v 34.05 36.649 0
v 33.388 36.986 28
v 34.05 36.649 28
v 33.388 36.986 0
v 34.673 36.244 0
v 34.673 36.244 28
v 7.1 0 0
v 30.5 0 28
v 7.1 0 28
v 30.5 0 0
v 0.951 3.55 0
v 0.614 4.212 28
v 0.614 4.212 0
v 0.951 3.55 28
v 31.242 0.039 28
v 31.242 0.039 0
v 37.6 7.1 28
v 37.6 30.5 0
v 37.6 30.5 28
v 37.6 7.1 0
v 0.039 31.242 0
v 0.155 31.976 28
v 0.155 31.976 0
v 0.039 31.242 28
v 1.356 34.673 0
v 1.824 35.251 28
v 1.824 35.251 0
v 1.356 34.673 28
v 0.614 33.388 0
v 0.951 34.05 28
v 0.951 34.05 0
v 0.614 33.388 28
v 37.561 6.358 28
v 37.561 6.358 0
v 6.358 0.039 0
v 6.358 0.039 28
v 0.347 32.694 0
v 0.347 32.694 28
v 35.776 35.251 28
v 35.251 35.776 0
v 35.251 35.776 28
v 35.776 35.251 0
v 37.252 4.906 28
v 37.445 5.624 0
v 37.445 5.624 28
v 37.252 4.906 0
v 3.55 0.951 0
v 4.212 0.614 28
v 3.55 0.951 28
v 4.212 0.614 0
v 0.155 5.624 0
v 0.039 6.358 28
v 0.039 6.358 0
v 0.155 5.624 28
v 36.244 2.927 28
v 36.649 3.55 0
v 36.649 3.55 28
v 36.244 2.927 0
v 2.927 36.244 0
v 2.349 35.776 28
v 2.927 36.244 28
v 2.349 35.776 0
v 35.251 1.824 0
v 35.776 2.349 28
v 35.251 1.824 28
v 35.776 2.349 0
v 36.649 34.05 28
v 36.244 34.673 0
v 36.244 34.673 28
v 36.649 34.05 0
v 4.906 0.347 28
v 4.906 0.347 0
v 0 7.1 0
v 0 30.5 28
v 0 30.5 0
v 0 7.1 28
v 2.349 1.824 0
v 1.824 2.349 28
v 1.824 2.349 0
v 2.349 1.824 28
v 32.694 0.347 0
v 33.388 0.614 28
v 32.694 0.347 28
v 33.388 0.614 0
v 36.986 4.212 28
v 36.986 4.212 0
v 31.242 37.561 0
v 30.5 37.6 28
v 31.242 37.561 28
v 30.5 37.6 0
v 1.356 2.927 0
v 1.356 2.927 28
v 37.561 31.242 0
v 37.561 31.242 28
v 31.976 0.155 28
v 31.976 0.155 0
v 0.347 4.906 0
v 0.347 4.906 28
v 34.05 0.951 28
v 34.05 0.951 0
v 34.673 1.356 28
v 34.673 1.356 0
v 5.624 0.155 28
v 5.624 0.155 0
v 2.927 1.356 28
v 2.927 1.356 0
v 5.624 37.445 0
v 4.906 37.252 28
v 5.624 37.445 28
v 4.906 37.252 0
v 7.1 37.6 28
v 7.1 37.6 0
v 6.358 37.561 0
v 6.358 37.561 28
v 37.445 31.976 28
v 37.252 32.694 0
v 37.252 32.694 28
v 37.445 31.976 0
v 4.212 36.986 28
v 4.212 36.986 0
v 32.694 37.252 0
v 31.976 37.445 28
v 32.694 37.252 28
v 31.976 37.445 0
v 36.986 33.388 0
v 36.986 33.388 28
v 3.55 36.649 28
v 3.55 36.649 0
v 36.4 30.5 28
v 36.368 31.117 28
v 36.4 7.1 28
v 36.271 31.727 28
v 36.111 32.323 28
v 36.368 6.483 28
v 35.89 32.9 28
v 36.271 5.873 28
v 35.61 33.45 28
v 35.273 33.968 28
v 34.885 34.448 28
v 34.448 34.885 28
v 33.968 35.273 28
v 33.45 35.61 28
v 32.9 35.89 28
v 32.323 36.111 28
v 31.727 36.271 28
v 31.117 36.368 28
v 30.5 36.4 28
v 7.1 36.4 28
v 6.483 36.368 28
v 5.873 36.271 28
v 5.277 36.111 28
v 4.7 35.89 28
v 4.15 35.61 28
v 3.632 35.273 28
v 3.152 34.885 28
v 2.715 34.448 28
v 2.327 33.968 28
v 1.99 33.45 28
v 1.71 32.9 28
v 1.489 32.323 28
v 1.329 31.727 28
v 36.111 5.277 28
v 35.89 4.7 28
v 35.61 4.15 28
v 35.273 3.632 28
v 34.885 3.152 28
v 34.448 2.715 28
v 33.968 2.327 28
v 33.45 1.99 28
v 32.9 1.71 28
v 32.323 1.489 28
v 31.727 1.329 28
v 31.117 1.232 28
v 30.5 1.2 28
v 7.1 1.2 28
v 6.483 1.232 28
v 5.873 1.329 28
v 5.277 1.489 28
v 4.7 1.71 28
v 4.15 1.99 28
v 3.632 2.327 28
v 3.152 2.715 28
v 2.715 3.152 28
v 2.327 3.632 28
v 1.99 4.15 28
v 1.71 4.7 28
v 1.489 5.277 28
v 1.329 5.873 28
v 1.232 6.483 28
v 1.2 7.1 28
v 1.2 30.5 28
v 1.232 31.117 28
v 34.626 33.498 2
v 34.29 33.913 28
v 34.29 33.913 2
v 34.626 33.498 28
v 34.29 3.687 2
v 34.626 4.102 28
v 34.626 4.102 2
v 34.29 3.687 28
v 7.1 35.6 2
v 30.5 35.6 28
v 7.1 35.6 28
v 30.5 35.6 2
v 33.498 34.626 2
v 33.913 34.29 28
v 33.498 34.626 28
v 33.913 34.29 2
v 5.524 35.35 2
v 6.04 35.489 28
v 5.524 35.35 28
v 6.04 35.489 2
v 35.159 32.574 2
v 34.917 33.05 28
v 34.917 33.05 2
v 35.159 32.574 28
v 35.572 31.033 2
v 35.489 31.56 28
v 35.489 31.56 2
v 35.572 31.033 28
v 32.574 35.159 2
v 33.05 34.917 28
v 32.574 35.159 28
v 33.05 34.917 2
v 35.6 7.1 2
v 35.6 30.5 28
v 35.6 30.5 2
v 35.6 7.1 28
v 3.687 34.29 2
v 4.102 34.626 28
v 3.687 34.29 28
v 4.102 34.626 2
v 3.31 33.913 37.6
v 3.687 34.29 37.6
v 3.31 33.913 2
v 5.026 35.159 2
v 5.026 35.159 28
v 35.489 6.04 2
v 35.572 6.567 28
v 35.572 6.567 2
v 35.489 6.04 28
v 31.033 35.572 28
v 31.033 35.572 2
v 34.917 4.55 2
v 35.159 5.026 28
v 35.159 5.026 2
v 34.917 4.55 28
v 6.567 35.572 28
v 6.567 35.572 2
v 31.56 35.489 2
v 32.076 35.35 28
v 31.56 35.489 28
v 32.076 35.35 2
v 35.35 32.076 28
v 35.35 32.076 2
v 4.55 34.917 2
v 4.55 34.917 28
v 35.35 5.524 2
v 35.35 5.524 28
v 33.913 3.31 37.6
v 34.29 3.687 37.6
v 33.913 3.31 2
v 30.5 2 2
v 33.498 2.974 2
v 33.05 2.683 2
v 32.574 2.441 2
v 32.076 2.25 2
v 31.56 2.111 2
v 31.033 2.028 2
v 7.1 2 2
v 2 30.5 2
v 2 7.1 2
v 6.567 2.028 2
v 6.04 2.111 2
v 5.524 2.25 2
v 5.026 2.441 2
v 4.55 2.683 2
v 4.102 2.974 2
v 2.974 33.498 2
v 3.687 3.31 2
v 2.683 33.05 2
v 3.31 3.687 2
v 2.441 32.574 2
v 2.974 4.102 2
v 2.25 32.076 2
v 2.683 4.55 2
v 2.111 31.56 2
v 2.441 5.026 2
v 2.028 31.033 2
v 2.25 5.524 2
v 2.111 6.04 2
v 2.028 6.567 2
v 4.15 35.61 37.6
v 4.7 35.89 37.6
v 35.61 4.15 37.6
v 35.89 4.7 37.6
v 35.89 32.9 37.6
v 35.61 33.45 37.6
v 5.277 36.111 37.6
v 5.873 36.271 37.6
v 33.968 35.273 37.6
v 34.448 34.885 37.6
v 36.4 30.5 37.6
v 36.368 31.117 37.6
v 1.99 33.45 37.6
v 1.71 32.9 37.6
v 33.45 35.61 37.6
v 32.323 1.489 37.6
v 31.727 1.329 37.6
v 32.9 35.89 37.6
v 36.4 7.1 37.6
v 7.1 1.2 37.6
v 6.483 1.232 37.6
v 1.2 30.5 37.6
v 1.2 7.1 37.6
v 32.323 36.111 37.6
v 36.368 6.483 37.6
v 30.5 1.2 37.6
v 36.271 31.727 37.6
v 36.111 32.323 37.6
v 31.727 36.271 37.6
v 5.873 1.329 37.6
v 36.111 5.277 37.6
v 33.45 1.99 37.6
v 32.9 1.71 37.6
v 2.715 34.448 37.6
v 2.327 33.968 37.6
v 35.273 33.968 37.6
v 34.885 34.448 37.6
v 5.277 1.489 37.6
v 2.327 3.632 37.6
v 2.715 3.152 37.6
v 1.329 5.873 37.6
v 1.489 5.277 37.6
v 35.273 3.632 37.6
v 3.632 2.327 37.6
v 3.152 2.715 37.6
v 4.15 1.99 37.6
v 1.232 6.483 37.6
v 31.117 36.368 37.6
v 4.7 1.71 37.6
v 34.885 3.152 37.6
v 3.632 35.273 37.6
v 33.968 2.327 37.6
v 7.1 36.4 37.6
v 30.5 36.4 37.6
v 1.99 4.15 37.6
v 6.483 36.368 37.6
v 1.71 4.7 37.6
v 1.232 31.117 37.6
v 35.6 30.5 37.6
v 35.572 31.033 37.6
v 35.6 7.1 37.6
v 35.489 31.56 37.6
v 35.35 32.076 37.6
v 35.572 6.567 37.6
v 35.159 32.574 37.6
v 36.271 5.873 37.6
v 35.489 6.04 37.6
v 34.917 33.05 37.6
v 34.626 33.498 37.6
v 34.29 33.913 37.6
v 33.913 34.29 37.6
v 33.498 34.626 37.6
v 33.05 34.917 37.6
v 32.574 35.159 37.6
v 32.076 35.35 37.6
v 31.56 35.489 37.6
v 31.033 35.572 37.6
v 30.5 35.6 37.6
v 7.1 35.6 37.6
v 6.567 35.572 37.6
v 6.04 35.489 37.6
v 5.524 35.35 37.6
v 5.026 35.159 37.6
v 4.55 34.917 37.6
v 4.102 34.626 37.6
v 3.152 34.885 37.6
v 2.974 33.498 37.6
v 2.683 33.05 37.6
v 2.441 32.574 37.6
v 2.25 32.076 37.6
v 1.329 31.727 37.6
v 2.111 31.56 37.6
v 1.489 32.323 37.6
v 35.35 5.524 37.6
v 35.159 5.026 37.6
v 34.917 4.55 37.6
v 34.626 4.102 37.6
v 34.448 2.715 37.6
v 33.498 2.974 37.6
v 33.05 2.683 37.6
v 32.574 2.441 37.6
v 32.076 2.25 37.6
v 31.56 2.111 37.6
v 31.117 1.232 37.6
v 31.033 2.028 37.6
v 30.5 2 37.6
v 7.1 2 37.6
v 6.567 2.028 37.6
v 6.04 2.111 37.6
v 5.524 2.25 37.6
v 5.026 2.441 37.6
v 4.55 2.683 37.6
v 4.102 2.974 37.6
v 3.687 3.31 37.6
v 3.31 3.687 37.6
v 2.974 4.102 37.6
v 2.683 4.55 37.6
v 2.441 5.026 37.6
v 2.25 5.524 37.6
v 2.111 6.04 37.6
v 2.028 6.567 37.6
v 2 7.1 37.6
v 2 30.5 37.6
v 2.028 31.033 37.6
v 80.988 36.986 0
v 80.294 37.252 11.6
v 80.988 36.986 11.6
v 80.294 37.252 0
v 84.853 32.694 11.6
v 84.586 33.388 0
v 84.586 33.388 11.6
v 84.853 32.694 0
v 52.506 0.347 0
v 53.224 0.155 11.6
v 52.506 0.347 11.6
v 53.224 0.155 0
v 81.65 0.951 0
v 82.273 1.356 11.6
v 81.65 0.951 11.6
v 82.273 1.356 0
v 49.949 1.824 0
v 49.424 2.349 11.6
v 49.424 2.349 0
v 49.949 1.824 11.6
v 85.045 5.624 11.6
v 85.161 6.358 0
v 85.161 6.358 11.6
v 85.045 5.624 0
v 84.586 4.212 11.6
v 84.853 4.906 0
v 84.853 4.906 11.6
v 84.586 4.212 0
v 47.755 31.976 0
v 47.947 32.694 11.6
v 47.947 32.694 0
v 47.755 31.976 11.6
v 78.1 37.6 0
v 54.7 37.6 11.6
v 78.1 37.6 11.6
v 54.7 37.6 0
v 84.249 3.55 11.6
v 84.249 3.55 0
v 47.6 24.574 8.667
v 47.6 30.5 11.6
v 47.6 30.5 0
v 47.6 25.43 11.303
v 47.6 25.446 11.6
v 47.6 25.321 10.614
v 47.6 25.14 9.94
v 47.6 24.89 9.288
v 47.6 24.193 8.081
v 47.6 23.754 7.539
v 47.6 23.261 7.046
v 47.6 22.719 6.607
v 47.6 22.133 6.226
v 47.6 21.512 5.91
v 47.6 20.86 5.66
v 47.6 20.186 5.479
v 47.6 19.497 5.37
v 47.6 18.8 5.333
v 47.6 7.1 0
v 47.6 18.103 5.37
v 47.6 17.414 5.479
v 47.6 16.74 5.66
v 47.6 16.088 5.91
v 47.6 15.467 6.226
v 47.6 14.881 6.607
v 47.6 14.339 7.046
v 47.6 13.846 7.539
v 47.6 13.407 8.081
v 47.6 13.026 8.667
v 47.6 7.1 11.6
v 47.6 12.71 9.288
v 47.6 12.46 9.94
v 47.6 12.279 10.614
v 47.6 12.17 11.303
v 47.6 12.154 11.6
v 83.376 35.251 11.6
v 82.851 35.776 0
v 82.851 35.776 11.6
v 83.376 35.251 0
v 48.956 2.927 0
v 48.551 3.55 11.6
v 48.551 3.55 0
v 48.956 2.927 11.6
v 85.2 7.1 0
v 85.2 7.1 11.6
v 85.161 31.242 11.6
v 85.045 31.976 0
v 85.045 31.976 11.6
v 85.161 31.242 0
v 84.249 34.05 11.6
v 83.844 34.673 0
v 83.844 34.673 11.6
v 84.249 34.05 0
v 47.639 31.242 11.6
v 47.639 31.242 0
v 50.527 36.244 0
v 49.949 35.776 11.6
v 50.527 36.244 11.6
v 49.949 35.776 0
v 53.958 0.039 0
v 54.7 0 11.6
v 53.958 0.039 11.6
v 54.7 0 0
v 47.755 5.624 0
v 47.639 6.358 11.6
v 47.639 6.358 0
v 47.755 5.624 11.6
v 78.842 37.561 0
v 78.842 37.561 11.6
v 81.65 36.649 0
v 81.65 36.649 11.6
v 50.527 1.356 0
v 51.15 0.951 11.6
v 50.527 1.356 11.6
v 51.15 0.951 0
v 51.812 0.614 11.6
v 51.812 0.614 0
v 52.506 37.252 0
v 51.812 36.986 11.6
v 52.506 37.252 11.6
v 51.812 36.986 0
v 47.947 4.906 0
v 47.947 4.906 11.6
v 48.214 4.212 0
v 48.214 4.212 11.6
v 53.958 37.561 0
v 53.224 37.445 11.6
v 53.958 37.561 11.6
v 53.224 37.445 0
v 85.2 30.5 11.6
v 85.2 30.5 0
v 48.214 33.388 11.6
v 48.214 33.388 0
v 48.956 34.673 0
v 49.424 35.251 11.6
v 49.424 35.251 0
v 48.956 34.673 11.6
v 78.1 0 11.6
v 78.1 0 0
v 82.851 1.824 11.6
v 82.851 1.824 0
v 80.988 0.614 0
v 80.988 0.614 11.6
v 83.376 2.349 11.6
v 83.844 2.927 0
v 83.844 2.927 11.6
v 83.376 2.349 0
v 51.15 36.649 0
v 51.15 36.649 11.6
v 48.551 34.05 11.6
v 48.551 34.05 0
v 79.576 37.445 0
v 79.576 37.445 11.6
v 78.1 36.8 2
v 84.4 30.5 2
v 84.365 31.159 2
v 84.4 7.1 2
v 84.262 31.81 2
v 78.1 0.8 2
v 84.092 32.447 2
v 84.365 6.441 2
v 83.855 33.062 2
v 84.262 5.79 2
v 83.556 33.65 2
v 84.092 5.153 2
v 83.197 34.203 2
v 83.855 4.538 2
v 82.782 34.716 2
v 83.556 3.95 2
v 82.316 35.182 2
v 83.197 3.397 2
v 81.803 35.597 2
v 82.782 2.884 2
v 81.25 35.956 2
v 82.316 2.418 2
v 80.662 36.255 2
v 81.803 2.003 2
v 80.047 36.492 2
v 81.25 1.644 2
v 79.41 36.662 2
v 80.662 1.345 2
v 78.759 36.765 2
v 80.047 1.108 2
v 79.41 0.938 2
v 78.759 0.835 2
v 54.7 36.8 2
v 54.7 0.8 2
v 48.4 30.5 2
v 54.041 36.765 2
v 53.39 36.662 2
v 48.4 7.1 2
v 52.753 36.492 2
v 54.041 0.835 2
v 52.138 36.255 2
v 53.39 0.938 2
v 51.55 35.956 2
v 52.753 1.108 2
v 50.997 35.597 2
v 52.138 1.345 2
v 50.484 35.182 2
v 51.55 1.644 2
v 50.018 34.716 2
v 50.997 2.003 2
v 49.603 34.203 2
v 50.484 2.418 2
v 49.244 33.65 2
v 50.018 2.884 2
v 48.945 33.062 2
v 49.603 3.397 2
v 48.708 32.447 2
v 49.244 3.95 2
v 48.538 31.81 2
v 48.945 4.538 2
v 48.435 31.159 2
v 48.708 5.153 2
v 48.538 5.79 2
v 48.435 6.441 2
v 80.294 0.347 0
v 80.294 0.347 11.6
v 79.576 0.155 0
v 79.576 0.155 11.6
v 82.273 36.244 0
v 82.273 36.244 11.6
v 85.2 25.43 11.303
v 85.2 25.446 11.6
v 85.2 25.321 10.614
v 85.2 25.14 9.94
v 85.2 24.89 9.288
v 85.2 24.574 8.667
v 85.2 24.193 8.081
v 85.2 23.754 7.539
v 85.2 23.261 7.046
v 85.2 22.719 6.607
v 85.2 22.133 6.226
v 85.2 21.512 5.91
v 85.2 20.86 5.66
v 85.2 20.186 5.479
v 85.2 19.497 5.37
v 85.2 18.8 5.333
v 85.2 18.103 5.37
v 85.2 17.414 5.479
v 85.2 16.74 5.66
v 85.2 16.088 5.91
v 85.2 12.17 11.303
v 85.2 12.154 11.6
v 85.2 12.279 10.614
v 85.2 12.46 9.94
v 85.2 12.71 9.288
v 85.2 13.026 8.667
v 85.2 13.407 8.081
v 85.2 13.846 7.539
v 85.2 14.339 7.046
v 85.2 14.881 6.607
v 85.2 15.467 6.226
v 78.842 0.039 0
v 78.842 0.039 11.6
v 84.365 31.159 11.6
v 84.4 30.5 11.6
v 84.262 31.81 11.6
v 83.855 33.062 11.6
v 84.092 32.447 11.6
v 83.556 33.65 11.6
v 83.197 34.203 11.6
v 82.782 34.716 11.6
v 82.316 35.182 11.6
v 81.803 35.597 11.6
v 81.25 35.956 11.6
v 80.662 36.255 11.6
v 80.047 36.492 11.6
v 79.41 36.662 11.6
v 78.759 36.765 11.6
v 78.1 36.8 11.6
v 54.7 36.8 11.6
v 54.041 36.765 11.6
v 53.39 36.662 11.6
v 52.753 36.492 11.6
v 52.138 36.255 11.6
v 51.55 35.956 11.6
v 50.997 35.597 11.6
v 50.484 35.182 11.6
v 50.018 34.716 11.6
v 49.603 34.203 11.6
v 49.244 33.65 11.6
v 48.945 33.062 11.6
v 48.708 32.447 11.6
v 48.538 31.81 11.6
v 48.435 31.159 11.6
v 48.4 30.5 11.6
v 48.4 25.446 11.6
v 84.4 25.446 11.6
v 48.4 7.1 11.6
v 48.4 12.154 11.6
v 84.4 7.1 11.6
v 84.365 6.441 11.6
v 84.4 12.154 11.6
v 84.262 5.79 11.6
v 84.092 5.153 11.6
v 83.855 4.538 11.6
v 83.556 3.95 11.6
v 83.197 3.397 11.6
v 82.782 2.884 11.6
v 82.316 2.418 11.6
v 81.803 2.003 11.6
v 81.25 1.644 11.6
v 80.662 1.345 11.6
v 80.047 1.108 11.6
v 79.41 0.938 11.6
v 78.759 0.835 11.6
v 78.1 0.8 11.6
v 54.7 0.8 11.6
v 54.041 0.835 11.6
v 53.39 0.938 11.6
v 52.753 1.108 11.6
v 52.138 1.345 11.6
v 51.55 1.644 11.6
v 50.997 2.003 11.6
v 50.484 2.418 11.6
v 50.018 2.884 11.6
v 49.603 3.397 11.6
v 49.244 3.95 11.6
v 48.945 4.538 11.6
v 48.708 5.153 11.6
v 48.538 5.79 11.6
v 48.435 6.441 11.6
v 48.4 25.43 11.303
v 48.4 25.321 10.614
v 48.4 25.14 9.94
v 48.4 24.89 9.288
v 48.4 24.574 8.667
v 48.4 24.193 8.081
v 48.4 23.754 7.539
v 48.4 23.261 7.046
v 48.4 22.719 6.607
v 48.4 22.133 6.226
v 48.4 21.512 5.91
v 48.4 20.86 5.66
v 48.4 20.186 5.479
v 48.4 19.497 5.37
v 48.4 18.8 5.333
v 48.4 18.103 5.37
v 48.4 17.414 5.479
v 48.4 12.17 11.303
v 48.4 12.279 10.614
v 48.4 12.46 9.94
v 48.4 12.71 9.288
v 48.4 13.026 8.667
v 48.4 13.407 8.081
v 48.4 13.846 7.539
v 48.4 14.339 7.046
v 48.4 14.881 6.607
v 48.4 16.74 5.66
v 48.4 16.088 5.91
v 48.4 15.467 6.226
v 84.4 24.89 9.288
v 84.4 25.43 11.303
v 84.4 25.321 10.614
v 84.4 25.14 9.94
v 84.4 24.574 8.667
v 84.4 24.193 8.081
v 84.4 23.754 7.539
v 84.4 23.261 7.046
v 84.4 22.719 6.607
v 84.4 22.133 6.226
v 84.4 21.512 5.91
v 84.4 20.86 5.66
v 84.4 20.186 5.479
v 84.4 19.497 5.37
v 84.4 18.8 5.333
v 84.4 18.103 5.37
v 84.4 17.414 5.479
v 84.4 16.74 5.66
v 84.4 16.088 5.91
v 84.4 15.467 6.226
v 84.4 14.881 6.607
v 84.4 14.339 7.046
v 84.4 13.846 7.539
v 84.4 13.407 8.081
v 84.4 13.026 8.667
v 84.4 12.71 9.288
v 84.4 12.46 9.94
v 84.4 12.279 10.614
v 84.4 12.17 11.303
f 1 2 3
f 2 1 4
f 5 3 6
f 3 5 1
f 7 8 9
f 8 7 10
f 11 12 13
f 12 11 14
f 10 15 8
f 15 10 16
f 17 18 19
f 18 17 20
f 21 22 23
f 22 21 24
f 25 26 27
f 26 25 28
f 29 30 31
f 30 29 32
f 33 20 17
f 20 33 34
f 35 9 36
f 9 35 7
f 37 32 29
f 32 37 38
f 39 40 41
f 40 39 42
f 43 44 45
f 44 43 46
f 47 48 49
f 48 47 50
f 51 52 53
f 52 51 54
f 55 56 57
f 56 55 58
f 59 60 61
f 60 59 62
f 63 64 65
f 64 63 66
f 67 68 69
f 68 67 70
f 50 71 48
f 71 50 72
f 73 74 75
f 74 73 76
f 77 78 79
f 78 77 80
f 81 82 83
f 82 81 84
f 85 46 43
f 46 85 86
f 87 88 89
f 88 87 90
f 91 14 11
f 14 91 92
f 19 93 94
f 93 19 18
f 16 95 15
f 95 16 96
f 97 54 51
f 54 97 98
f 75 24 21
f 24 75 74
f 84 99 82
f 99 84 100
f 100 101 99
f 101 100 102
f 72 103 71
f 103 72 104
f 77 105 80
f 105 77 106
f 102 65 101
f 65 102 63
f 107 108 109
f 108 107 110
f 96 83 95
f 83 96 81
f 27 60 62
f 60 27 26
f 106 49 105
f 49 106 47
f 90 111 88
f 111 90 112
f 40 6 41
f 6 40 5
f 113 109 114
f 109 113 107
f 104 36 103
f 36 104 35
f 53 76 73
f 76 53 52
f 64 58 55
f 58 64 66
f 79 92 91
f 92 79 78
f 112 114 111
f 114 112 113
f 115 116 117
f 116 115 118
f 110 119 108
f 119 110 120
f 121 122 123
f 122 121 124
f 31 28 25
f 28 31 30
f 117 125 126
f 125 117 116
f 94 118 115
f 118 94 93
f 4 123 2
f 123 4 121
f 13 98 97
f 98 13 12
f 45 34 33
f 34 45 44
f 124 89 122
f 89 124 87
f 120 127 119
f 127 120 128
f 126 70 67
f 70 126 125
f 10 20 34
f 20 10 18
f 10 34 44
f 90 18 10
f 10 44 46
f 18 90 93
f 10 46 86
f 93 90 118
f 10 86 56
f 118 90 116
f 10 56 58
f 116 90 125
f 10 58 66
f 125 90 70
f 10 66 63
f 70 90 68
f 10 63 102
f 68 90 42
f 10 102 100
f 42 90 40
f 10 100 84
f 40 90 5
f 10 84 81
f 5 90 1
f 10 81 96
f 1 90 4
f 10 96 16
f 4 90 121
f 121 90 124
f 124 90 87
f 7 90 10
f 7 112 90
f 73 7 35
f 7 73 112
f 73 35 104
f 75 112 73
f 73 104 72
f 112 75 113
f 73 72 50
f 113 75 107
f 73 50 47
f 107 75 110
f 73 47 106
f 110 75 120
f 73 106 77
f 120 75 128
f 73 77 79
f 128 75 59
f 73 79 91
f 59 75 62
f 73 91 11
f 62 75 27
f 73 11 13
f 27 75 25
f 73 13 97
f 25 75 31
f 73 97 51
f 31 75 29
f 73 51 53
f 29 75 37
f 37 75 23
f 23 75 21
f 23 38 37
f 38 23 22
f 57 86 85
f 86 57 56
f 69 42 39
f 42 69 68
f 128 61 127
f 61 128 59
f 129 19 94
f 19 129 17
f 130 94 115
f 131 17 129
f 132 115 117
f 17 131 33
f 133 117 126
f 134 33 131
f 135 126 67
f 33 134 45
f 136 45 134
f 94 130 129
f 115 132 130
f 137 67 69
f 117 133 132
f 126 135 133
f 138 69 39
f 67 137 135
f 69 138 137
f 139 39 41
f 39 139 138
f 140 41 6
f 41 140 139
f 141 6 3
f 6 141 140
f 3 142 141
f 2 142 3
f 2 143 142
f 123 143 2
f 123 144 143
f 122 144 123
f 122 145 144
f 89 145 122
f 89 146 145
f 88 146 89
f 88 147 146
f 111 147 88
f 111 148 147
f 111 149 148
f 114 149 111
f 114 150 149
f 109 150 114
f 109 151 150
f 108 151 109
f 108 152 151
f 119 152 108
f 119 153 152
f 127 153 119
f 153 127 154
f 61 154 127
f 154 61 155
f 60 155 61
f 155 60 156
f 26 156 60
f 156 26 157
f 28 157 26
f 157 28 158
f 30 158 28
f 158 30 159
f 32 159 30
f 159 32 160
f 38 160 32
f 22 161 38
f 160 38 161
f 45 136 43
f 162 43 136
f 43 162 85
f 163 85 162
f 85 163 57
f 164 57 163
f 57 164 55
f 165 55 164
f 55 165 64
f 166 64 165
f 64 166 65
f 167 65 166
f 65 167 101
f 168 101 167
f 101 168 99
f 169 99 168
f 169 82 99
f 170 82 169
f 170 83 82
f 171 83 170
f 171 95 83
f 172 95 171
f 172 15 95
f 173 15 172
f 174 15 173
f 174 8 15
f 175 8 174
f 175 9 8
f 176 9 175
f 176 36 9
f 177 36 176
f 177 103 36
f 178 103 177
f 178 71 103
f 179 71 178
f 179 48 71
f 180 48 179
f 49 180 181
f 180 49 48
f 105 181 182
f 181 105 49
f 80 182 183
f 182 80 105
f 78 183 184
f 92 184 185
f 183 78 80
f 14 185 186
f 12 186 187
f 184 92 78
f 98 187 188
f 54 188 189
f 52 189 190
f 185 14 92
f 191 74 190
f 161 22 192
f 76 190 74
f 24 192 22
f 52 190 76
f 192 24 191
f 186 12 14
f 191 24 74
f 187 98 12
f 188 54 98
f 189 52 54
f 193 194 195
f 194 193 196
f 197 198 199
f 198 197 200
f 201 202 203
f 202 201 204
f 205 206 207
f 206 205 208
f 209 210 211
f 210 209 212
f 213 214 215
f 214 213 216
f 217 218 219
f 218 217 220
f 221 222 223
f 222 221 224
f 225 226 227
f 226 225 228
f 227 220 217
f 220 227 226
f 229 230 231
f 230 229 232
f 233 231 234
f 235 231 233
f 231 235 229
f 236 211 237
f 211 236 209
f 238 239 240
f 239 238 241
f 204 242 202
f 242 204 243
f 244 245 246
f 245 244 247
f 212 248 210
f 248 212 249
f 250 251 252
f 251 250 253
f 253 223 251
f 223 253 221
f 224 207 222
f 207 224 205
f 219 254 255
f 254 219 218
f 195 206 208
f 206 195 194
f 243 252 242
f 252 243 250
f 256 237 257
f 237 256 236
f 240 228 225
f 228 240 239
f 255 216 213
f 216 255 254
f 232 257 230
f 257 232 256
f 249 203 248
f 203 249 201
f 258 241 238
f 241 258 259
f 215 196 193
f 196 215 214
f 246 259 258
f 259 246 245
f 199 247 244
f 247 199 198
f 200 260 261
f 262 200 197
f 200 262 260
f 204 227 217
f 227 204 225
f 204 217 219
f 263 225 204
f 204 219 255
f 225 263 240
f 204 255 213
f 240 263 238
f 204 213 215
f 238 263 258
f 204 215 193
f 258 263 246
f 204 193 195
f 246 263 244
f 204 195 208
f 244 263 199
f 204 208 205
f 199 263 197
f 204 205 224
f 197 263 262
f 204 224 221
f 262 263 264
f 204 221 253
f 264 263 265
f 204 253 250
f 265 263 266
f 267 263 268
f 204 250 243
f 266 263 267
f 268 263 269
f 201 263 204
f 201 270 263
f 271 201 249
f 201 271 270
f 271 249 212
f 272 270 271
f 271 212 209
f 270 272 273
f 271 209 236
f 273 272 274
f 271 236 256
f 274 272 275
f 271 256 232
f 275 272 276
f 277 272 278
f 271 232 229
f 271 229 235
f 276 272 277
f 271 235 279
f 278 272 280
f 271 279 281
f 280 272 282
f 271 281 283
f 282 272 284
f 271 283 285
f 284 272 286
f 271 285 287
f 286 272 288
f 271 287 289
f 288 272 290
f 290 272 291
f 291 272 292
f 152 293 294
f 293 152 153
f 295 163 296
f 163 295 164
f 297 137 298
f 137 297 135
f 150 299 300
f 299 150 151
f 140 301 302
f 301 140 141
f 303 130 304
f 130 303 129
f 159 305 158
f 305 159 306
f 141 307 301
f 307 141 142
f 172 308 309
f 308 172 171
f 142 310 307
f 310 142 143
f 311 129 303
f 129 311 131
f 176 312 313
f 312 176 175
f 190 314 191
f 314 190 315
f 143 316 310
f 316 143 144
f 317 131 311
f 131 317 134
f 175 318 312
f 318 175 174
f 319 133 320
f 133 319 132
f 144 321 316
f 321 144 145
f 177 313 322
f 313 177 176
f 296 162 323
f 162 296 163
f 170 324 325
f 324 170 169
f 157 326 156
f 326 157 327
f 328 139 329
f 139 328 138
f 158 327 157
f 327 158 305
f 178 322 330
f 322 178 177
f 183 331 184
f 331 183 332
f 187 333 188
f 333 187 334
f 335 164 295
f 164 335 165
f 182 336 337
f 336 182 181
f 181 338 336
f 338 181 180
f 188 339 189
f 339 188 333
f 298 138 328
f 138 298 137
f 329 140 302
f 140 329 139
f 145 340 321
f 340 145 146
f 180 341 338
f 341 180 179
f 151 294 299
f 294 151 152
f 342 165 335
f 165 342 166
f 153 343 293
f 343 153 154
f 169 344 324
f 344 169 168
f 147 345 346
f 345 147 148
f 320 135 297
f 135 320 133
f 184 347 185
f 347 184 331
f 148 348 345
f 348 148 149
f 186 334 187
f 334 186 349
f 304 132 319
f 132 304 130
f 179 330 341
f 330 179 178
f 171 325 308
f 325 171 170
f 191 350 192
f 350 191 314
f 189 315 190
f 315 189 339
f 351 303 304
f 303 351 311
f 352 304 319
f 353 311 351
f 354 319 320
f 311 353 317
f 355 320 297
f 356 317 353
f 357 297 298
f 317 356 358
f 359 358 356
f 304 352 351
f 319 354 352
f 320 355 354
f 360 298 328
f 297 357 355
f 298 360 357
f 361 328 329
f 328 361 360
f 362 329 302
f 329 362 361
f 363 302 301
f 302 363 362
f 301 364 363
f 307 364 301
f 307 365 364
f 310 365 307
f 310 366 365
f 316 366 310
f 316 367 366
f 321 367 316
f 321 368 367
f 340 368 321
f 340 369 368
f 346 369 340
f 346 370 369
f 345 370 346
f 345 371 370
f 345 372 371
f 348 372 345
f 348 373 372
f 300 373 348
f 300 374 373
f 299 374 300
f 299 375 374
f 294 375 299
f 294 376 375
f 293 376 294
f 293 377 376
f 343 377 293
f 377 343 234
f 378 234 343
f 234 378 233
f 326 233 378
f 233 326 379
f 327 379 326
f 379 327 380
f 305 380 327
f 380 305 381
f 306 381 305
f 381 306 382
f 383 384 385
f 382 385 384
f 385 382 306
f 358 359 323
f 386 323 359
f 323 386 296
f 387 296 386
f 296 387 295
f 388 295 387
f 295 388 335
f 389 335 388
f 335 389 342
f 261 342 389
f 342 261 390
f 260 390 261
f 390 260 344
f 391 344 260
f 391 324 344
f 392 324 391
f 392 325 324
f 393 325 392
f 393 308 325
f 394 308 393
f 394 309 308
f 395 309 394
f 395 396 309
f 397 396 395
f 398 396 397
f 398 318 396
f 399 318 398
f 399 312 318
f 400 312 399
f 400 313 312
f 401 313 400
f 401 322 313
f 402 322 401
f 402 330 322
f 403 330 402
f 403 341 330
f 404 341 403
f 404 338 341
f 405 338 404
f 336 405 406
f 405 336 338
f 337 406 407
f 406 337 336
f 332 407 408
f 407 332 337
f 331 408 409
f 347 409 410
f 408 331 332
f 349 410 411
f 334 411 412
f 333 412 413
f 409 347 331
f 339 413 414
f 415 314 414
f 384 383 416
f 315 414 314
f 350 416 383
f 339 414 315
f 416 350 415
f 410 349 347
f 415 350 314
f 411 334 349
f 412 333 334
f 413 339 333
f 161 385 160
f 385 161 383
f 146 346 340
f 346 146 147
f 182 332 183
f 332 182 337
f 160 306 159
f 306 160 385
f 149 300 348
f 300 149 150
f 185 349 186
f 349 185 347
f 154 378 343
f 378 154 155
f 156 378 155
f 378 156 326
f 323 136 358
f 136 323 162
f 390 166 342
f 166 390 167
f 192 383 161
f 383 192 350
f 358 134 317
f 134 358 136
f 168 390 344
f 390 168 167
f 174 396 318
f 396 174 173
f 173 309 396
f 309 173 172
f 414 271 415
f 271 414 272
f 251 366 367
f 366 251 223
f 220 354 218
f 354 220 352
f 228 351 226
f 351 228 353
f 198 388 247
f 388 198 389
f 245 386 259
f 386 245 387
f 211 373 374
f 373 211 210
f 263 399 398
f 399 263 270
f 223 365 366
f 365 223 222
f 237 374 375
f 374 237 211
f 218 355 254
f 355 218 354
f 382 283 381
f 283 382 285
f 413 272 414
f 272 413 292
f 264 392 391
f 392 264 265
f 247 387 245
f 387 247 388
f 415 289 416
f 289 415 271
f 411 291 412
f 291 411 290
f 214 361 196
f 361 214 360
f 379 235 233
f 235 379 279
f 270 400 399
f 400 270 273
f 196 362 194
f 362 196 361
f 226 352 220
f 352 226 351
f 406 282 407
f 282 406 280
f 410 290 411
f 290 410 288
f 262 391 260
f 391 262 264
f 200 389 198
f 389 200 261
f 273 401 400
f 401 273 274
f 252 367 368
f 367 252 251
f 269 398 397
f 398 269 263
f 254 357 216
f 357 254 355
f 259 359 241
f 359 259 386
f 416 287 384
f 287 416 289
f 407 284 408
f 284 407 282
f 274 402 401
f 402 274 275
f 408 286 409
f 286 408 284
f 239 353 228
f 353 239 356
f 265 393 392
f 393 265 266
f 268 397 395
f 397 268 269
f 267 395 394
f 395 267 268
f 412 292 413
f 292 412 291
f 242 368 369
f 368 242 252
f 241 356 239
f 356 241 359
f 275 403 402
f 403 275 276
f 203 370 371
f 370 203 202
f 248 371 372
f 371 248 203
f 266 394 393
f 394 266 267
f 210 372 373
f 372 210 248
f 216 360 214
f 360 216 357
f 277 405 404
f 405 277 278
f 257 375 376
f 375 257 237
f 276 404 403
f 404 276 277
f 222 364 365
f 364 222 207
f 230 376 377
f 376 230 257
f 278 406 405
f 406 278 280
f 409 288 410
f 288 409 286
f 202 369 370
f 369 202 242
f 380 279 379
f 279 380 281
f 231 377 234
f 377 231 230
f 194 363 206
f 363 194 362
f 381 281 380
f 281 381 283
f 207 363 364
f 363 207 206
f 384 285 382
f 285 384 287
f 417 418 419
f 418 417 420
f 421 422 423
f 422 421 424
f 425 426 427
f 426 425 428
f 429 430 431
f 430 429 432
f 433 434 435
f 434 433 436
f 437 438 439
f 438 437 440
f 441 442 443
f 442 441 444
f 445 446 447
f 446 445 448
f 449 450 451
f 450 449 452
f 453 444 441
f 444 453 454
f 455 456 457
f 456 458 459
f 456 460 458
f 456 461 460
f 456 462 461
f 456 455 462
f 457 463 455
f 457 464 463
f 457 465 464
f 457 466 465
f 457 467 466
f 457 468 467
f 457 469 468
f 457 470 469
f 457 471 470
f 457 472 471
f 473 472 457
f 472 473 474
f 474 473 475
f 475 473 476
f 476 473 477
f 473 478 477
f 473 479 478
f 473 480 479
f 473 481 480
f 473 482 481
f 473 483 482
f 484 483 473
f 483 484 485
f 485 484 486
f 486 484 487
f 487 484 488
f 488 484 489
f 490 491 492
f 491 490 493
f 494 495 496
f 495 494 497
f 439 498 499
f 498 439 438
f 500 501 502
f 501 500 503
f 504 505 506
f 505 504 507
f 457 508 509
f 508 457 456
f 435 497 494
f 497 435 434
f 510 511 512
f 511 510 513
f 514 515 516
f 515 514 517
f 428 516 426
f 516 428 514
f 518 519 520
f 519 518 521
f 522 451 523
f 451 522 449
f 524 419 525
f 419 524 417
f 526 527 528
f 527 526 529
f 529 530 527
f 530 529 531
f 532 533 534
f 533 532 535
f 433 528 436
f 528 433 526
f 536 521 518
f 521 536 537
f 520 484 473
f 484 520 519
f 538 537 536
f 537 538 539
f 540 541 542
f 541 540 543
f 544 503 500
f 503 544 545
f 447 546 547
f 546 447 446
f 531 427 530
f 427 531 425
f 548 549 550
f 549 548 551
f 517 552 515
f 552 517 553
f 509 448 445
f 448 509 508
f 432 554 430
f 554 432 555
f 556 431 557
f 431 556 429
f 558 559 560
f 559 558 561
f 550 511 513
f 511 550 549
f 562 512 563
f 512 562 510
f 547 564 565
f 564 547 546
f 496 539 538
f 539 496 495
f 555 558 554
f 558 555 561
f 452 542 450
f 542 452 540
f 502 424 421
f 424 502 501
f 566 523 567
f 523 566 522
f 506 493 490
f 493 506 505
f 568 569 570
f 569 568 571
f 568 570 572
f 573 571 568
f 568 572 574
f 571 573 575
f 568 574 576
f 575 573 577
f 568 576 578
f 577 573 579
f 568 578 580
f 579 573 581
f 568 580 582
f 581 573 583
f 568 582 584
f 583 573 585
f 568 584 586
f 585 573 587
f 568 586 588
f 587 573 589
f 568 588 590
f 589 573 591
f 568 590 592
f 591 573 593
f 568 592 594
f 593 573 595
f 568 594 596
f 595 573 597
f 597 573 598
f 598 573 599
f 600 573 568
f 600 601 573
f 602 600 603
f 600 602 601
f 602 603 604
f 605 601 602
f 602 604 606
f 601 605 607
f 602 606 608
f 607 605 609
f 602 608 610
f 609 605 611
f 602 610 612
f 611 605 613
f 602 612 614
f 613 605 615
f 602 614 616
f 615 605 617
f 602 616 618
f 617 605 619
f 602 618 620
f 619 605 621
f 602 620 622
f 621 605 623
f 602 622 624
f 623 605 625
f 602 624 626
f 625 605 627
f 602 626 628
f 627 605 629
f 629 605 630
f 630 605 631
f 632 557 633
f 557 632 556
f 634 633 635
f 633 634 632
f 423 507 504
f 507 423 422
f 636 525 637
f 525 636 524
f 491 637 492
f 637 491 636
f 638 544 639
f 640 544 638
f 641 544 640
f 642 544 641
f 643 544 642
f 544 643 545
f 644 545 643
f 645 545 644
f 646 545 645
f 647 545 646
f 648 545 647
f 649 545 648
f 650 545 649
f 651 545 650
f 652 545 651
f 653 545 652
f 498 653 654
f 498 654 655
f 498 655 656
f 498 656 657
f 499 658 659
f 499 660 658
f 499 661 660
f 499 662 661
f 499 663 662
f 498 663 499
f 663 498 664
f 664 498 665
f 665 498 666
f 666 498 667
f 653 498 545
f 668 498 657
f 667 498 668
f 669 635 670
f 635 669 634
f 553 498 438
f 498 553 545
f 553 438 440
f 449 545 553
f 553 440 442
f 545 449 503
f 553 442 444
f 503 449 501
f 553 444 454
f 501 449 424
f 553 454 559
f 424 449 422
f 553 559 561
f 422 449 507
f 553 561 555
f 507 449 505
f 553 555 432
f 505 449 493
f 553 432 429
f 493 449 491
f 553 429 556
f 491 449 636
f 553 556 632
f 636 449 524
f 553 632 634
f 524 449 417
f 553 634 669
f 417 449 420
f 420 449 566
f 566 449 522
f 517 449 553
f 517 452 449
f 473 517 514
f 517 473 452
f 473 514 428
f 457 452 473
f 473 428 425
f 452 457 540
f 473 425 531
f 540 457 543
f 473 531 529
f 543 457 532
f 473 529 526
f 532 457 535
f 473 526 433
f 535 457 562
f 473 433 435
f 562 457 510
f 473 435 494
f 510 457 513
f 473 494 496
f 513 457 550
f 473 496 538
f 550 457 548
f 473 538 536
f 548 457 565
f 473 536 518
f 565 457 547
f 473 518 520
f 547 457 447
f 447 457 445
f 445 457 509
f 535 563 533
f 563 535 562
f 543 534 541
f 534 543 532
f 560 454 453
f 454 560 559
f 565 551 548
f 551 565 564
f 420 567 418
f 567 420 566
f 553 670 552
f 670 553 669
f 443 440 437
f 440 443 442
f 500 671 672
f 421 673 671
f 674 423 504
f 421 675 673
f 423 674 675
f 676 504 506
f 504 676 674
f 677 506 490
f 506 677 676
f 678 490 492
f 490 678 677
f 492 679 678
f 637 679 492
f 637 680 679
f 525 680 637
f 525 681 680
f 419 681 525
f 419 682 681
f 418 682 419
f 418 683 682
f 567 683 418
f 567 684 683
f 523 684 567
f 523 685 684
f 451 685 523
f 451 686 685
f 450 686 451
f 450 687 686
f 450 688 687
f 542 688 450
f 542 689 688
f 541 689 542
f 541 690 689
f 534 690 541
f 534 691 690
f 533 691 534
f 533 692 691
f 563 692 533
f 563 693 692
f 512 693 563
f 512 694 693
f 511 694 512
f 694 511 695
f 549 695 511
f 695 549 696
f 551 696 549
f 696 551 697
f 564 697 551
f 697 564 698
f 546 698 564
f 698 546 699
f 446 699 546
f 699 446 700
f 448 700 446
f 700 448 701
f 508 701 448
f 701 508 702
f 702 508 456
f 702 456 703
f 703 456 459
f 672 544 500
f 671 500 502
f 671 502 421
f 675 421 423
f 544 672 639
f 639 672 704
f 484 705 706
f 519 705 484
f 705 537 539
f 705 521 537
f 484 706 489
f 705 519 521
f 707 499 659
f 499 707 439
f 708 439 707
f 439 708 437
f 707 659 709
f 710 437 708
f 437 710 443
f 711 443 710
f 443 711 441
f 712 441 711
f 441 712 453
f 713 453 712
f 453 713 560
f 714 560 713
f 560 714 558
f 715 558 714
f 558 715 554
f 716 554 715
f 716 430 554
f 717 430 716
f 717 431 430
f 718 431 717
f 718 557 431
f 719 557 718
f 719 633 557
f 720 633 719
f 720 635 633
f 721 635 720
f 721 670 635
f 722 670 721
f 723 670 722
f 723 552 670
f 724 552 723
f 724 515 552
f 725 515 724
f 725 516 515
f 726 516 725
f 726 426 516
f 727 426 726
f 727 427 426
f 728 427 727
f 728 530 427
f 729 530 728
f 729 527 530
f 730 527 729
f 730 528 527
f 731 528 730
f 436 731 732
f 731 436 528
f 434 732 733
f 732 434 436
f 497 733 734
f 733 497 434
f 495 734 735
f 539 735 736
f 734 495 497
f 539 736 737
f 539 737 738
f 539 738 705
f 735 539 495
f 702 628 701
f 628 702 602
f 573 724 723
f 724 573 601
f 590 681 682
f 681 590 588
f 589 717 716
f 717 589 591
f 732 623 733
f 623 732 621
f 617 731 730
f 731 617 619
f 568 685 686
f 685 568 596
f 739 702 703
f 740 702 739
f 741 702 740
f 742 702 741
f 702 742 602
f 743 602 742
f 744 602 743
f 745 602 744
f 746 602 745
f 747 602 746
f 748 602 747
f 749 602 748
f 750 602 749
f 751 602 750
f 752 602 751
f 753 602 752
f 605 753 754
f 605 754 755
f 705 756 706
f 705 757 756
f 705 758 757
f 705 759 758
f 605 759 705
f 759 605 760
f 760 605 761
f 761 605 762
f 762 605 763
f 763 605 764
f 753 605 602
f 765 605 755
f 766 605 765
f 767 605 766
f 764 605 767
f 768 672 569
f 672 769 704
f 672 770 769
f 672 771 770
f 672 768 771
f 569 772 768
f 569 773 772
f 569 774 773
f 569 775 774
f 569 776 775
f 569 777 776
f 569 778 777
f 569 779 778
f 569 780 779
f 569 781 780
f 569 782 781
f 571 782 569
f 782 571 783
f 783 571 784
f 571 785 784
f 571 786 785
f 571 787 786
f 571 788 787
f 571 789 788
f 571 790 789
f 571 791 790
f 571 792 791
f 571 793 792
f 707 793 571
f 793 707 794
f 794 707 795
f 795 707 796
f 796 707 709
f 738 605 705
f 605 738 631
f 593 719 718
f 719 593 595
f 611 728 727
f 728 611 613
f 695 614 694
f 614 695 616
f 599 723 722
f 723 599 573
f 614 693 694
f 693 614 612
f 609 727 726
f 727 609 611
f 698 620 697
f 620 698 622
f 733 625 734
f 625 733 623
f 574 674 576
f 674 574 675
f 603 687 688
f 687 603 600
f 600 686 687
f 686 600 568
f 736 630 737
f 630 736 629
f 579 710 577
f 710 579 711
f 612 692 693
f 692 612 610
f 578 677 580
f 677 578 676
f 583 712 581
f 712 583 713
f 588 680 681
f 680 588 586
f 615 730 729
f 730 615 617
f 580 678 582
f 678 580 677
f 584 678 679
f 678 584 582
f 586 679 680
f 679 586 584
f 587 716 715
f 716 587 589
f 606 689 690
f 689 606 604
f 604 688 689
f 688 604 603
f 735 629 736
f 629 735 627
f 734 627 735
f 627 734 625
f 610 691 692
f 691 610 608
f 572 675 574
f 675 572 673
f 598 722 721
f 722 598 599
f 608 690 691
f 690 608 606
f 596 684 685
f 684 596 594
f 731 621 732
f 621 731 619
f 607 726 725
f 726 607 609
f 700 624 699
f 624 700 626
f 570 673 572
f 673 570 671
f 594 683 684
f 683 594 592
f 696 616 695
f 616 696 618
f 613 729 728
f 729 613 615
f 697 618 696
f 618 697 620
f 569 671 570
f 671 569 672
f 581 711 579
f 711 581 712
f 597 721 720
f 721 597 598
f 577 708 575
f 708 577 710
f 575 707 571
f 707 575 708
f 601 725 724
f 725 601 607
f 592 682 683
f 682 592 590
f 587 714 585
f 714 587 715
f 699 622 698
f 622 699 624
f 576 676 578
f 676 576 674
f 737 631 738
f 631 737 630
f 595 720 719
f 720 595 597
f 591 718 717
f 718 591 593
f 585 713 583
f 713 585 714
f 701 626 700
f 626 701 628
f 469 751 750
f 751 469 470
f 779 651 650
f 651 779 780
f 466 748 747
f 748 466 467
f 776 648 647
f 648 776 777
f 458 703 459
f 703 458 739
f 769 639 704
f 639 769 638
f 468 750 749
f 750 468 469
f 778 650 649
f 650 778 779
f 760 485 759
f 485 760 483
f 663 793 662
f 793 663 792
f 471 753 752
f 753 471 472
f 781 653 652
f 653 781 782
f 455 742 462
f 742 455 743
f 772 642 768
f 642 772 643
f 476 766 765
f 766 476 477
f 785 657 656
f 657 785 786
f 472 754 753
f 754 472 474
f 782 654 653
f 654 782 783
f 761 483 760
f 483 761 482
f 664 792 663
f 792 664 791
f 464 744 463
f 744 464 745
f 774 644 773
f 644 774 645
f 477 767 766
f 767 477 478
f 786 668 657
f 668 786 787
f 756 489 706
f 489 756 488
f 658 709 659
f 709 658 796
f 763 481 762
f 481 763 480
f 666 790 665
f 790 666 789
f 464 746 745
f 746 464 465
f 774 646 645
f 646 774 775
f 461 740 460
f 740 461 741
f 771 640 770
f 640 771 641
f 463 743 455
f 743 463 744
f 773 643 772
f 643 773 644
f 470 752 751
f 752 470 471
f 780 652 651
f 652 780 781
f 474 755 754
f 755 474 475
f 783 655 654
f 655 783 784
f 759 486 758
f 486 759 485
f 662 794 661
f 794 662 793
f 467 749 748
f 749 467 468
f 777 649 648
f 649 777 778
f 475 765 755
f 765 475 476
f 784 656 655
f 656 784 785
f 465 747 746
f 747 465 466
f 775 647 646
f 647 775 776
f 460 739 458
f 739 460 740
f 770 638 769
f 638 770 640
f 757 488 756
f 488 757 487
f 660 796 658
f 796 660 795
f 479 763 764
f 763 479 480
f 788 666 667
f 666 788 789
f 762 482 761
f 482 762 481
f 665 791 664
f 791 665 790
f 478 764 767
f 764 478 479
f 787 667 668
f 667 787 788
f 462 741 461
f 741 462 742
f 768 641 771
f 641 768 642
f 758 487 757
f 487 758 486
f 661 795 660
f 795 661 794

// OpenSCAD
// file: lib_boxes5.scad
// boxes5.scad

/**
x1 = width
y1 = depth
z1 = height
r1 = radius of corners
*/
module rounded_rectangle(x1, y1, z1, r1) {
    if (r1 > 0.00001) { // deal with rounding errors 
		translate([r1, r1, 0]) {
			minkowski () {
				cube([x1-2*r1, y1-2*r1, z1/2]);
				cylinder(z1/2, r1, r1);
			}
		}
	} else {
		cube([x1, y1, z1]);
	}
}

/**
x1 = width
y1 = depth
z1 = height
r1 = radius of corners
d1 = thickness
*/
module rounded_ring(x1, y1, z1, r1, d1) {
	difference () {
		rounded_rectangle(x1, y1, z1, r1);
		translate([d1, d1, 0]) {
			rounded_rectangle(x1-2*d1, y1-2*d1, z1+0.001, r1-d1);
		}
	}
}

/**
x1 = width
y1 = depth
z1 = height
r1 = radius of corners
d1 = thickness
*/
module open_box(x1, y1, z1, r1, d1) {
	rounded_rectangle(x1, y1, d1, r1);
	rounded_ring(x1, y1, z1, r1, d1);
}

/**
Bottom of a friction fit box
x1 = width
y1 = depth
z1 = height
r1 = radius of corners
d1 = thickness
z2 = friction
d2 = tolerance
*/
module box_bottom(x1, y1, z1, r1, d1, z2, d2) {
	x2 = d1/2+d2/2;
	y2 = d1/2+d2/2;
	x3 = x1-2*x2;
	y3 = y1-2*y2;
	r3 = max(r1-x2, 0);
	d3 = d1/2-d2/2;
	mm = floor(min(x1, y1)/10);

	difference() {
		union() {
			open_box(x1, y1, z1-z2, r1, d1);
			translate([x2, y2, 0]) {
				rounded_ring(x3, y3, z1-d2, r3, d3);
			}
		}
		*for (ii = [1 : mm]) {
			xx1 = 5*ii;
			xx2 = x1-10*ii;
			yy1 = 5*ii;
			yy2 = y1-10*ii;
			rr2 = r1-5*ii;
			translate([xx1, yy1, 0]) {
				rounded_ring(xx2, yy2, 0.65, rr2, 3);
			}
		}
	}
}

/**
Top of a friction fit box.
x1 = width
y1 = depth
z1 = height
r1 = radius of corners
d1 = thickness
z2 = friction
d2 = tolerance
*/
module box_top(x1, y1, z1, r1, d1, z2, d2) {
	x2 = d1/2+d2;
	y2 = d1/2+d2;
	x3 = x1-2*x2;
	y3 = y1-2*y2;
	z3 = z1+z2-d2;
	r3 = max(r1-x2, 0);
	d3 = d1/2-d2/2;
	mm = floor(min(x1, y1)/10);
	
	difference() {
		union() {
			open_box(x1, y1, z1-z2, r1, d1);
			rounded_ring(x1, y1, z1-d2, r1, d3);
		}

		*for (ii = [1 : mm]) {
			xx1 = 5*ii;
			xx2 = x1-10*ii;
			yy1 = 5*ii;
			yy2 = y1-10*ii;
			rr2 = r1-5*ii;
			translate([xx1, yy1, 0]) {
				rounded_ring(xx2, yy2, 0.65, rr2, 3);
			}
		}
	}
}

/**
x1 = width
y1 = depth
z1 = height
r1 = radius of corners
d1 = thickness
z2 = friction
d2 = tolerance
r2 = radius of fingers
*/
module fingers(x1, y1, z1, r1, d1, z2, d2, r2) {
	zz = max(z1, r2+d2);
    translate([0, y1/2, zz]) {
		rotate([0, 90, 0]) {
			translate([0, 0, -1]) {
				cylinder(x1+2, r2, r2);
			}
		}
	}
}

/**
x1 = width
y1 = depth
z1 = height
d1 = thickness
z2 = friction
d2 = tolerance
*/
module pimples(x1, y1, z1, d1, z2, d2) {
	translate([x1/2, (d1/2), z1-(z2/2)]) {
		sphere(d1/2);
	}
	translate([x1/2, y1-(d1/2), z1-(z2/2)]) {
		sphere(d1/2);
	}
}
// main file
// boxes5_text.scad

use <lib_boxes5.scad>

$fn = 60.00;
//x = 42.00-2*1.2;    // inner length
//y = 42.00-2*1.2;    // inner depth
//z = (85.00-1.2)/2;    // inner height
//r = 15.00-4.70-1.20;     // inner corner radius
f = 10.00;       // friction
t = 0.40;     // tolerance
d = 0.40*4+t; // wall thickness

xc = 40-2*1.2;
yc = 40-2*1.2;
zb = 40-d;
zt = 10+d;
rc = 15-4.7-2-1.2;


box_bottom(xc, yc, zb, rc, d, f, t);
translate([xc+10, 0, 0]) {
	difference() {
		box_top(xc, yc, zt, rc, d, f, t);
		fingers(xc, yc, zt, rc, d, f, t, f*2/3);
	}
}
